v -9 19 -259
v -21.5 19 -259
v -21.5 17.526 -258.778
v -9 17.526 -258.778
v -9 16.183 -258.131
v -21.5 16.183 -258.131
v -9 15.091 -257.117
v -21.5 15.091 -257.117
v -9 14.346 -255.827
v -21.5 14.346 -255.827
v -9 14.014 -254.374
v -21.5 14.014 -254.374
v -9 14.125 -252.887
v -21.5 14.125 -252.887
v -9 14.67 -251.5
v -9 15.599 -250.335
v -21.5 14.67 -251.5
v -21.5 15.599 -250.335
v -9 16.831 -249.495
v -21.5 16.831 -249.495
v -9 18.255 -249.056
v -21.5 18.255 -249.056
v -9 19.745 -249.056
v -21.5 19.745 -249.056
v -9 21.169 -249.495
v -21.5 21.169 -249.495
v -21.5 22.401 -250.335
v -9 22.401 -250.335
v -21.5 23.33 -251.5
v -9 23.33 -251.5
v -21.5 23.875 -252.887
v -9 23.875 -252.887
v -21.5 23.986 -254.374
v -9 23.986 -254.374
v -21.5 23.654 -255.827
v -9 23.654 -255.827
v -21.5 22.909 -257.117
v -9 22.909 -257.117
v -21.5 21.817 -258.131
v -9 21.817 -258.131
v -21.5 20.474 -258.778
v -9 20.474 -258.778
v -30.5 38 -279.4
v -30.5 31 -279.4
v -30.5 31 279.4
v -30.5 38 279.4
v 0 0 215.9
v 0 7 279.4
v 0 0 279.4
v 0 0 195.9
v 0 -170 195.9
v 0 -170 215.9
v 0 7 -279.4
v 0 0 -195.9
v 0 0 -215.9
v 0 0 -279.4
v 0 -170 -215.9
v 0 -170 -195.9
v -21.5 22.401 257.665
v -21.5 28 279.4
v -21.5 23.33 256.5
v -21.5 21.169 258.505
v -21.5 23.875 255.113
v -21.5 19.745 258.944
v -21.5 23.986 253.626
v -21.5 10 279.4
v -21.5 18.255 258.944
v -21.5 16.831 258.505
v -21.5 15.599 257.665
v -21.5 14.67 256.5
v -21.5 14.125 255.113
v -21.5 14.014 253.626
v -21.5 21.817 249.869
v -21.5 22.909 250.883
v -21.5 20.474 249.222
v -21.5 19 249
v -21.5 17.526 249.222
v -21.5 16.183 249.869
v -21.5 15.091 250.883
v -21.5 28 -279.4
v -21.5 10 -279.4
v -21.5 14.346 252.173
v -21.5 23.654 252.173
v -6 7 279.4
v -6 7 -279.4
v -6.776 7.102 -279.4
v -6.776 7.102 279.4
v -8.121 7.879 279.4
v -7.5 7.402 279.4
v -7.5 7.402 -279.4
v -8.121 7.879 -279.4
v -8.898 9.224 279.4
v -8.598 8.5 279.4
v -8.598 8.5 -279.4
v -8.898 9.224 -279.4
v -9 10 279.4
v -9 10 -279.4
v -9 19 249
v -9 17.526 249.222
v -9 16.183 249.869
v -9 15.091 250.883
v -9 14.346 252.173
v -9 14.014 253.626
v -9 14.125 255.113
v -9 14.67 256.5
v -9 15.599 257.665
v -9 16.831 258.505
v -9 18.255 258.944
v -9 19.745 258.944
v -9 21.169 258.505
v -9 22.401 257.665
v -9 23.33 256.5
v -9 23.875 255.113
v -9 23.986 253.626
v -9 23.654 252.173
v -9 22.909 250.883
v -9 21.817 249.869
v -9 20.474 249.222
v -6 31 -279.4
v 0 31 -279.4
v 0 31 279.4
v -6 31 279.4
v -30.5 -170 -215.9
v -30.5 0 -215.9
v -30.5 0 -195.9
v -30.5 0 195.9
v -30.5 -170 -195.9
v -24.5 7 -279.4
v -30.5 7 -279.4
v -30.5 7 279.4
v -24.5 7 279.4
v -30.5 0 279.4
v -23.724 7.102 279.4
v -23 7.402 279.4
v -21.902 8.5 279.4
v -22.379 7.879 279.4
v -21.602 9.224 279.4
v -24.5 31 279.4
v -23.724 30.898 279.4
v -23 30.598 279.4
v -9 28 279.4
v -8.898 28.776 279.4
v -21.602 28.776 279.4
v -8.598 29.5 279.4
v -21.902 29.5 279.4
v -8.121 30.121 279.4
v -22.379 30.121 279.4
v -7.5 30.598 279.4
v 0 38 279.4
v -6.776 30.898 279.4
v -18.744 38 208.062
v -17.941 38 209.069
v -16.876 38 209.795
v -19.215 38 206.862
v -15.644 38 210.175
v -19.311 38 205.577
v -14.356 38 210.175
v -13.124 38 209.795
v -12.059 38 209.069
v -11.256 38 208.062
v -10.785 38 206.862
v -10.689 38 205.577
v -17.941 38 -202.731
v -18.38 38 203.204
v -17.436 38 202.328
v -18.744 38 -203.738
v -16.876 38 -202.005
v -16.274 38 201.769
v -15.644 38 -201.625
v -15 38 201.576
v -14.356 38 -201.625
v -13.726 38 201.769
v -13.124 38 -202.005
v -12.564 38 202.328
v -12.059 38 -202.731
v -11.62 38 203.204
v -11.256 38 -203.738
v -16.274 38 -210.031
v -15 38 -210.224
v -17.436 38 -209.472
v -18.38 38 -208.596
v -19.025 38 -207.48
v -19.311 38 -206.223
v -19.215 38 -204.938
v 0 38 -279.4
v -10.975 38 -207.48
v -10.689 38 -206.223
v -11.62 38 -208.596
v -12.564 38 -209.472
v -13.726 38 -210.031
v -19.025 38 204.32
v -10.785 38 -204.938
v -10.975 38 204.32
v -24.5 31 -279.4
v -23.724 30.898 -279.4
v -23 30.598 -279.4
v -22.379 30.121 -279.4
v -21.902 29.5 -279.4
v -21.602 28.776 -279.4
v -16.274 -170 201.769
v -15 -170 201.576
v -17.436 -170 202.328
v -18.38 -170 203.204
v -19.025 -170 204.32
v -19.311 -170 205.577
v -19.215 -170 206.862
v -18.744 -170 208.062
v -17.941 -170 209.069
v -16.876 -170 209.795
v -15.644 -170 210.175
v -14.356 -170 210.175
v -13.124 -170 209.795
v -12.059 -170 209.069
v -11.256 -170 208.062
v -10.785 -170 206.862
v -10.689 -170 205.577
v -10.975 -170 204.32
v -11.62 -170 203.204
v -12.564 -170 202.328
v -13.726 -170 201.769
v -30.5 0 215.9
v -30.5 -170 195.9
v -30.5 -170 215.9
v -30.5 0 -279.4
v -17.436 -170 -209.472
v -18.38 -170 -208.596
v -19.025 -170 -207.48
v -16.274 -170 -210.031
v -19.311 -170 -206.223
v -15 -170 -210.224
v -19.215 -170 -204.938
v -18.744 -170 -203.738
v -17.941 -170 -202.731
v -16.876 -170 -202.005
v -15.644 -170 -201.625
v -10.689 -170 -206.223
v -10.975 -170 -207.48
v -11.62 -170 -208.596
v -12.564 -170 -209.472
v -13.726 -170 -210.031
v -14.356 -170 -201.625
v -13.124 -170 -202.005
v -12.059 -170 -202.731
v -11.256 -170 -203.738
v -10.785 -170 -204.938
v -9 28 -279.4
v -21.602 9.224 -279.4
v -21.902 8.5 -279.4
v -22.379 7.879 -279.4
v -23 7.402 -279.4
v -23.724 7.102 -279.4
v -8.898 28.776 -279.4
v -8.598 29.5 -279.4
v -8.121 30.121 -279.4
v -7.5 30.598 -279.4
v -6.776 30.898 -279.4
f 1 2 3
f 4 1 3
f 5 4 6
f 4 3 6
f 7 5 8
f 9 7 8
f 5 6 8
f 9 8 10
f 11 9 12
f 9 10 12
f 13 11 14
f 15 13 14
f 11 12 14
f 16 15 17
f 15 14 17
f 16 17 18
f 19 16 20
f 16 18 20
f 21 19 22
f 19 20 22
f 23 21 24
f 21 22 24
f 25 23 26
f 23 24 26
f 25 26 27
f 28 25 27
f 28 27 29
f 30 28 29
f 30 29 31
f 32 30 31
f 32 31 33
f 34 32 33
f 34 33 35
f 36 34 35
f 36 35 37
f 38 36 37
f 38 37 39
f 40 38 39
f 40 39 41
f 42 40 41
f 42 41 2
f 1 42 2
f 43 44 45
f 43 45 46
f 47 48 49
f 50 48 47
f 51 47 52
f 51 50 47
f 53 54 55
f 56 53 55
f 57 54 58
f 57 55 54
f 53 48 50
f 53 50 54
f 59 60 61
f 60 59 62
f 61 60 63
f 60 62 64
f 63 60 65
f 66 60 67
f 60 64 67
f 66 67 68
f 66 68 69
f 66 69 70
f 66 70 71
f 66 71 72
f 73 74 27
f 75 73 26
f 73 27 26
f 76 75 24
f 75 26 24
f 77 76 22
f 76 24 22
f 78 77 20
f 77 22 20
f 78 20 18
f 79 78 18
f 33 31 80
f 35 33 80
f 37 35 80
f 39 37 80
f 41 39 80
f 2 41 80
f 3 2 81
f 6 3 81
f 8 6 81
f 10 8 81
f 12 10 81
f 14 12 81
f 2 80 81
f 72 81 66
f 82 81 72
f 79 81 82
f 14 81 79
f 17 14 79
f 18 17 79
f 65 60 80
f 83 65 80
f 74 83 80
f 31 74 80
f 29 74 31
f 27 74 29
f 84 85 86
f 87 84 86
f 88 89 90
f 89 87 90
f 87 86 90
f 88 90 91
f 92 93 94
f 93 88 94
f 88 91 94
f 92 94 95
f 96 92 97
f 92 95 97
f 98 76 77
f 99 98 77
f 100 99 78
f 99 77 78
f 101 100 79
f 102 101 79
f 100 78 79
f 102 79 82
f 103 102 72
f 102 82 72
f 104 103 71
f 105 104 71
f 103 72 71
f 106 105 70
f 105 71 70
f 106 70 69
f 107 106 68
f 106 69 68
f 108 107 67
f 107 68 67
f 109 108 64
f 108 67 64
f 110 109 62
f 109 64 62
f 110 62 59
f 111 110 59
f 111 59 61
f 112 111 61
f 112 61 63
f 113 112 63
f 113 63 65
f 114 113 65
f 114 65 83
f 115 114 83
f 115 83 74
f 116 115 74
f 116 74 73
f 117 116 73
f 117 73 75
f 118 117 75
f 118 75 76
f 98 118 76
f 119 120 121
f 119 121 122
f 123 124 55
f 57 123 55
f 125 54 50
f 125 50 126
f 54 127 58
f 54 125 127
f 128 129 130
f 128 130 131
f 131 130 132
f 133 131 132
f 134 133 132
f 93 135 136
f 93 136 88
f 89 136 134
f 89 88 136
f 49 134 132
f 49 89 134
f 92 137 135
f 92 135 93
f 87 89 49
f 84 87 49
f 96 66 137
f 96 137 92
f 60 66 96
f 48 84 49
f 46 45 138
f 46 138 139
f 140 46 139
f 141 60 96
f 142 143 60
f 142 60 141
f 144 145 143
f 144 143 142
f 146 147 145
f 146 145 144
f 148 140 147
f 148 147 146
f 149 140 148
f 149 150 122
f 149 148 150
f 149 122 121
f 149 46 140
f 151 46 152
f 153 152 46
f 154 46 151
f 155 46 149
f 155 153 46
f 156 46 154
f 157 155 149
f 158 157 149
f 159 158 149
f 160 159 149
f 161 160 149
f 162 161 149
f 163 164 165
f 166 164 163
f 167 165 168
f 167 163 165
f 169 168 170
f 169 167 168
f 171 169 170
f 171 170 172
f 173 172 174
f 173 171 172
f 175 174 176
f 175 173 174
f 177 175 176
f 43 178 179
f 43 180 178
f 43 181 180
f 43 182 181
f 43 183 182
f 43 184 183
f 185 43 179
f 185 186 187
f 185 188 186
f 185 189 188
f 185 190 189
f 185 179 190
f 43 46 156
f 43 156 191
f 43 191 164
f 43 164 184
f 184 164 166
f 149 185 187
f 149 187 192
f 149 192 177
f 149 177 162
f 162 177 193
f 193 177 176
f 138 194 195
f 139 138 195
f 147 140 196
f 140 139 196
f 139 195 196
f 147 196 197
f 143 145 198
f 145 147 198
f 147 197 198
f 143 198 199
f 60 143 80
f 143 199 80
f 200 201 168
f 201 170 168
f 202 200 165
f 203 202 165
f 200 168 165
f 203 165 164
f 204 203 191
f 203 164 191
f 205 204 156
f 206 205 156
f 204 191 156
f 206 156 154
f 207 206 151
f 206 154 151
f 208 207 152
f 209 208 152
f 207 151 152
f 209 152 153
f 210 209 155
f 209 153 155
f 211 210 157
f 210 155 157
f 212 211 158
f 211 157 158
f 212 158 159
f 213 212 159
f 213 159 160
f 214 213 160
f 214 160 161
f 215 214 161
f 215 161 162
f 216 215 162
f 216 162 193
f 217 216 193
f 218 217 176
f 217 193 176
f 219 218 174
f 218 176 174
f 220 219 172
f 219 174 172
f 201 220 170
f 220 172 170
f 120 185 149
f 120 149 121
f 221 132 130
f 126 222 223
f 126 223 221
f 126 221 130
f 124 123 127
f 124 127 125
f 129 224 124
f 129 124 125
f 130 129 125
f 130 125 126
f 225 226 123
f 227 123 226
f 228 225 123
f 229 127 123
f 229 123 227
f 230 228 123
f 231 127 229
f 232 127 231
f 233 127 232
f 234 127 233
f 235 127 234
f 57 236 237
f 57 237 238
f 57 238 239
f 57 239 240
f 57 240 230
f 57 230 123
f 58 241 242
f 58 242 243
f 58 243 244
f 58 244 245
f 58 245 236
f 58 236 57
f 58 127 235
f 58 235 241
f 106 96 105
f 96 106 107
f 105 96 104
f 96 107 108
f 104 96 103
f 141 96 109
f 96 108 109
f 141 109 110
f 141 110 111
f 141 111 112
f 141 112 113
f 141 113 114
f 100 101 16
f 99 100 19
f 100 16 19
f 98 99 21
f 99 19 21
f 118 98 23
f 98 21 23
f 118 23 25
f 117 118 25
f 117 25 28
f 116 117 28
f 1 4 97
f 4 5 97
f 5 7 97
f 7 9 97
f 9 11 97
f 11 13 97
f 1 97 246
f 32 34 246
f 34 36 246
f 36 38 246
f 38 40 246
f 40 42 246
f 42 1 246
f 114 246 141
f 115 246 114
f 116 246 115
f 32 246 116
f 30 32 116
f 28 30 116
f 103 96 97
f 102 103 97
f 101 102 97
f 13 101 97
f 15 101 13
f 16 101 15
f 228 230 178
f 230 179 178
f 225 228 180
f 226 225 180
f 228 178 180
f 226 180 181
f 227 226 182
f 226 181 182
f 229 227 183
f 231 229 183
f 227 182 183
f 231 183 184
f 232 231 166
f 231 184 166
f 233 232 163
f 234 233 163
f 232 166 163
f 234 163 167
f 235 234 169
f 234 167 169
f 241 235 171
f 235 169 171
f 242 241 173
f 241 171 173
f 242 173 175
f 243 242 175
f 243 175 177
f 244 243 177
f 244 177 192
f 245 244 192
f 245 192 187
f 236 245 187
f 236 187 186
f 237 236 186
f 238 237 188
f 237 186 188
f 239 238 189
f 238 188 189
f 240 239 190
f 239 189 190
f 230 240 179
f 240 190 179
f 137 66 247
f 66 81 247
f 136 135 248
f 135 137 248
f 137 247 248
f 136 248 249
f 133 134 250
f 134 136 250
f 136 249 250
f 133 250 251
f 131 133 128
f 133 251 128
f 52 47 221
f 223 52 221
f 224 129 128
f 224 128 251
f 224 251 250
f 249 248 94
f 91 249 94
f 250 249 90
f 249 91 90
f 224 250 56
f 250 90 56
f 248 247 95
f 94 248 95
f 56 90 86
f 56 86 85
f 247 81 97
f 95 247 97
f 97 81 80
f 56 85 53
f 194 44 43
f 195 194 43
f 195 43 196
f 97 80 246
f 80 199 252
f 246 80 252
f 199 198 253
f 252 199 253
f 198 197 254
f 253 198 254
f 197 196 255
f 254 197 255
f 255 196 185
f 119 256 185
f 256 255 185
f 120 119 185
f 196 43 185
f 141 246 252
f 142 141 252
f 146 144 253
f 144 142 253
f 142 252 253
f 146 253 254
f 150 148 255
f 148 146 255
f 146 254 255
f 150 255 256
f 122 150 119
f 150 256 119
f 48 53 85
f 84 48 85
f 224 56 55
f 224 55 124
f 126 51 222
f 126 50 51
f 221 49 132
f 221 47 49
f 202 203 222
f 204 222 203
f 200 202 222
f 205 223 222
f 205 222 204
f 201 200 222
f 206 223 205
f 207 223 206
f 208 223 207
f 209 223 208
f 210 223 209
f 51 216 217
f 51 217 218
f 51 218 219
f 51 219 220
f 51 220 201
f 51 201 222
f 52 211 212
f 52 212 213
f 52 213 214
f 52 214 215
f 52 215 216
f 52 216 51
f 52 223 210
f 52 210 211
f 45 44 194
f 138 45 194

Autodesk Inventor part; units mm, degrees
ref_plane "YZ Plane" through (0, 0, 0) normal (1, 0, 0) x (0, 1, 0)
ref_plane "XZ Plane" through (0, 0, 0) normal (0, 1, 0) x (-1, 0, 0)
ref_plane "XY Plane" through (0, 0, 0) normal (0, 0, 1) x (1, 0, 0)
sketch "Sketch1" plane through (0, 0, 0) normal (0, 0, 1) x (1, 0, 0)
  line L0 (0, 0) -> (-30.5, 0)
  line L1 (-30.5, 0) -> (-30.5, 38)
  line L2 (-30.5, 38) -> (0, 38)
  line L3 (0, 38) -> (0, 0)
  line L4 (0, 0) -> (0, 7)
  line L5 (0, 38) -> (0, 31)
  line L6 (0, 31) -> (-6, 31)
  line L7 (0, 7) -> (-6, 7)
  line L8 (-9, 10) -> (-9, 28)
  line L9 (-30.5, 38) -> (-30.5, 31)
  line L10 (-30.5, 31) -> (-24.5, 31)
  line L11 (-21.5, 28) -> (-21.5, 10)
  line L12 (-30.5, 0) -> (-30.5, 7)
  line L13 (-30.5, 7) -> (-24.5, 7)
  arc A0 (-6, 31) -> (-9, 28) centre (-6, 28) ccw
  arc A1 (-9, 10) -> (-6, 7) centre (-6, 10) ccw
  arc A2 (-21.5, 28) -> (-24.5, 31) centre (-24.5, 28) ccw
  arc A3 (-24.5, 7) -> (-21.5, 10) centre (-24.5, 10) ccw
  point P0 (-9, 31)
  point P1 (-21.5, 31)
  dimension "d0" = 30.5
  dimension "d1" = 38
  dimension "d2" = 7
  dimension "d3" = 7
  dimension "d4" = 9
  dimension "d6" = 7
  dimension "d7" = 9
  dimension "d8" = 7
  dimension "d9" = 3
  dimension "d11" = 3
extrude "Extrusion1" add sketch "Sketch1" along normal mid plane 558.8 contours L0 L1 L13 A3 L11 A2 L10 L2 L3 L6 A0 L8 A1 L7
hole "Hole1" at (-9, 19, 254) direction (-1, 0, 0) diameter 10 depth 25
hole "Hole2" at (-9, 19, -254) direction (-1, 0, 0) diameter 10 depth 25 tip angle 118
sketch "Sketch2" plane through (-30.5, 0, 279.4) normal (0, -1, 0) x (1, 0, 0)
  line L0 (0, 0) -> (30.5, 0) projected
  line L1 (15.25, 0) -> (15.25, -63.5)
  line L2 (15.25, -63.5) -> (0, -63.5)
  line L3 (0, -558.8) -> (0, 0) projected
  line L4 (15.25, -63.5) -> (30.5, -63.5)
  line L5 (30.5, -63.5) -> (30.5, -83.5)
  line L6 (30.5, -558.8) -> (30.5, 0) projected
  line L7 (30.5, -83.5) -> (0, -83.5)
  line L8 (0, -83.5) -> (0, -63.5)
  line L9 (30.5, -558.8) -> (0, -558.8) projected
  line L10 (15.25, -558.8) -> (15.25, -495.3)
  line L11 (15.25, -495.3) -> (30.5, -495.3)
  line L12 (15.25, -495.3) -> (0, -495.3)
  line L13 (0, -495.3) -> (0, -475.3)
  line L14 (0, -475.3) -> (30.5, -475.3)
  line L15 (30.5, -475.3) -> (30.5, -495.3)
  point P0 (30.5, -279.4)
  dimension "d33" = 63.5
  dimension "d34" = 20
  dimension "d35" = 30.5
  dimension "d36" = 63.5
  dimension "d37" = 20
extrude "Extrusion2" add sketch "Sketch2" along normal blind 170 contours L2 L4 L5 L7 L3 | L14 L6 L11 L12 L3
sketch "Sketch5" plane through (-30.5, 38, 279.4) normal (0, 1, 0) x (1, 0, 0)
  point P0 (30.5, 279.4)
sketch "Sketch8" plane through (-30.5, -170, 279.4) normal (0, -1, 0) x (1, 0, 0)
  line L0 (30.5, -83.5) -> (30.5, -63.5) projected
  line L1 (30.5, -63.5) -> (0, -63.5) projected
  point P0 (30.5, -279.4)
  point P1 (15.5, -73.5)
  dimension "d72" = 15
  dimension "d73" = 10
hole "Hole5" at (-15, -170, 205.9) direction (0, 1, 0) diameter 8.647 end through all thread size "M10x1.25" class "6H" standard "ANSI Metric M Profile"
sketch "Sketch9" plane through (-30.5, -170, 279.4) normal (0, -1, 0) x (1, 0, 0)
  line L0 (30.5, -495.3) -> (30.5, -475.3) projected
  line L1 (30.5, -475.3) -> (0, -475.3) projected
  point P0 (30.5, -279.4)
  point P1 (15.5, -485.3)
  dimension "d81" = 15
  dimension "d82" = 10
hole "Hole6" at (-15, -170, -205.9) direction (0, 1, 0) diameter 8.647 end through all thread size "M10x1.25" class "6H" standard "ANSI Metric M Profile"
properties part number "BarraEx"
